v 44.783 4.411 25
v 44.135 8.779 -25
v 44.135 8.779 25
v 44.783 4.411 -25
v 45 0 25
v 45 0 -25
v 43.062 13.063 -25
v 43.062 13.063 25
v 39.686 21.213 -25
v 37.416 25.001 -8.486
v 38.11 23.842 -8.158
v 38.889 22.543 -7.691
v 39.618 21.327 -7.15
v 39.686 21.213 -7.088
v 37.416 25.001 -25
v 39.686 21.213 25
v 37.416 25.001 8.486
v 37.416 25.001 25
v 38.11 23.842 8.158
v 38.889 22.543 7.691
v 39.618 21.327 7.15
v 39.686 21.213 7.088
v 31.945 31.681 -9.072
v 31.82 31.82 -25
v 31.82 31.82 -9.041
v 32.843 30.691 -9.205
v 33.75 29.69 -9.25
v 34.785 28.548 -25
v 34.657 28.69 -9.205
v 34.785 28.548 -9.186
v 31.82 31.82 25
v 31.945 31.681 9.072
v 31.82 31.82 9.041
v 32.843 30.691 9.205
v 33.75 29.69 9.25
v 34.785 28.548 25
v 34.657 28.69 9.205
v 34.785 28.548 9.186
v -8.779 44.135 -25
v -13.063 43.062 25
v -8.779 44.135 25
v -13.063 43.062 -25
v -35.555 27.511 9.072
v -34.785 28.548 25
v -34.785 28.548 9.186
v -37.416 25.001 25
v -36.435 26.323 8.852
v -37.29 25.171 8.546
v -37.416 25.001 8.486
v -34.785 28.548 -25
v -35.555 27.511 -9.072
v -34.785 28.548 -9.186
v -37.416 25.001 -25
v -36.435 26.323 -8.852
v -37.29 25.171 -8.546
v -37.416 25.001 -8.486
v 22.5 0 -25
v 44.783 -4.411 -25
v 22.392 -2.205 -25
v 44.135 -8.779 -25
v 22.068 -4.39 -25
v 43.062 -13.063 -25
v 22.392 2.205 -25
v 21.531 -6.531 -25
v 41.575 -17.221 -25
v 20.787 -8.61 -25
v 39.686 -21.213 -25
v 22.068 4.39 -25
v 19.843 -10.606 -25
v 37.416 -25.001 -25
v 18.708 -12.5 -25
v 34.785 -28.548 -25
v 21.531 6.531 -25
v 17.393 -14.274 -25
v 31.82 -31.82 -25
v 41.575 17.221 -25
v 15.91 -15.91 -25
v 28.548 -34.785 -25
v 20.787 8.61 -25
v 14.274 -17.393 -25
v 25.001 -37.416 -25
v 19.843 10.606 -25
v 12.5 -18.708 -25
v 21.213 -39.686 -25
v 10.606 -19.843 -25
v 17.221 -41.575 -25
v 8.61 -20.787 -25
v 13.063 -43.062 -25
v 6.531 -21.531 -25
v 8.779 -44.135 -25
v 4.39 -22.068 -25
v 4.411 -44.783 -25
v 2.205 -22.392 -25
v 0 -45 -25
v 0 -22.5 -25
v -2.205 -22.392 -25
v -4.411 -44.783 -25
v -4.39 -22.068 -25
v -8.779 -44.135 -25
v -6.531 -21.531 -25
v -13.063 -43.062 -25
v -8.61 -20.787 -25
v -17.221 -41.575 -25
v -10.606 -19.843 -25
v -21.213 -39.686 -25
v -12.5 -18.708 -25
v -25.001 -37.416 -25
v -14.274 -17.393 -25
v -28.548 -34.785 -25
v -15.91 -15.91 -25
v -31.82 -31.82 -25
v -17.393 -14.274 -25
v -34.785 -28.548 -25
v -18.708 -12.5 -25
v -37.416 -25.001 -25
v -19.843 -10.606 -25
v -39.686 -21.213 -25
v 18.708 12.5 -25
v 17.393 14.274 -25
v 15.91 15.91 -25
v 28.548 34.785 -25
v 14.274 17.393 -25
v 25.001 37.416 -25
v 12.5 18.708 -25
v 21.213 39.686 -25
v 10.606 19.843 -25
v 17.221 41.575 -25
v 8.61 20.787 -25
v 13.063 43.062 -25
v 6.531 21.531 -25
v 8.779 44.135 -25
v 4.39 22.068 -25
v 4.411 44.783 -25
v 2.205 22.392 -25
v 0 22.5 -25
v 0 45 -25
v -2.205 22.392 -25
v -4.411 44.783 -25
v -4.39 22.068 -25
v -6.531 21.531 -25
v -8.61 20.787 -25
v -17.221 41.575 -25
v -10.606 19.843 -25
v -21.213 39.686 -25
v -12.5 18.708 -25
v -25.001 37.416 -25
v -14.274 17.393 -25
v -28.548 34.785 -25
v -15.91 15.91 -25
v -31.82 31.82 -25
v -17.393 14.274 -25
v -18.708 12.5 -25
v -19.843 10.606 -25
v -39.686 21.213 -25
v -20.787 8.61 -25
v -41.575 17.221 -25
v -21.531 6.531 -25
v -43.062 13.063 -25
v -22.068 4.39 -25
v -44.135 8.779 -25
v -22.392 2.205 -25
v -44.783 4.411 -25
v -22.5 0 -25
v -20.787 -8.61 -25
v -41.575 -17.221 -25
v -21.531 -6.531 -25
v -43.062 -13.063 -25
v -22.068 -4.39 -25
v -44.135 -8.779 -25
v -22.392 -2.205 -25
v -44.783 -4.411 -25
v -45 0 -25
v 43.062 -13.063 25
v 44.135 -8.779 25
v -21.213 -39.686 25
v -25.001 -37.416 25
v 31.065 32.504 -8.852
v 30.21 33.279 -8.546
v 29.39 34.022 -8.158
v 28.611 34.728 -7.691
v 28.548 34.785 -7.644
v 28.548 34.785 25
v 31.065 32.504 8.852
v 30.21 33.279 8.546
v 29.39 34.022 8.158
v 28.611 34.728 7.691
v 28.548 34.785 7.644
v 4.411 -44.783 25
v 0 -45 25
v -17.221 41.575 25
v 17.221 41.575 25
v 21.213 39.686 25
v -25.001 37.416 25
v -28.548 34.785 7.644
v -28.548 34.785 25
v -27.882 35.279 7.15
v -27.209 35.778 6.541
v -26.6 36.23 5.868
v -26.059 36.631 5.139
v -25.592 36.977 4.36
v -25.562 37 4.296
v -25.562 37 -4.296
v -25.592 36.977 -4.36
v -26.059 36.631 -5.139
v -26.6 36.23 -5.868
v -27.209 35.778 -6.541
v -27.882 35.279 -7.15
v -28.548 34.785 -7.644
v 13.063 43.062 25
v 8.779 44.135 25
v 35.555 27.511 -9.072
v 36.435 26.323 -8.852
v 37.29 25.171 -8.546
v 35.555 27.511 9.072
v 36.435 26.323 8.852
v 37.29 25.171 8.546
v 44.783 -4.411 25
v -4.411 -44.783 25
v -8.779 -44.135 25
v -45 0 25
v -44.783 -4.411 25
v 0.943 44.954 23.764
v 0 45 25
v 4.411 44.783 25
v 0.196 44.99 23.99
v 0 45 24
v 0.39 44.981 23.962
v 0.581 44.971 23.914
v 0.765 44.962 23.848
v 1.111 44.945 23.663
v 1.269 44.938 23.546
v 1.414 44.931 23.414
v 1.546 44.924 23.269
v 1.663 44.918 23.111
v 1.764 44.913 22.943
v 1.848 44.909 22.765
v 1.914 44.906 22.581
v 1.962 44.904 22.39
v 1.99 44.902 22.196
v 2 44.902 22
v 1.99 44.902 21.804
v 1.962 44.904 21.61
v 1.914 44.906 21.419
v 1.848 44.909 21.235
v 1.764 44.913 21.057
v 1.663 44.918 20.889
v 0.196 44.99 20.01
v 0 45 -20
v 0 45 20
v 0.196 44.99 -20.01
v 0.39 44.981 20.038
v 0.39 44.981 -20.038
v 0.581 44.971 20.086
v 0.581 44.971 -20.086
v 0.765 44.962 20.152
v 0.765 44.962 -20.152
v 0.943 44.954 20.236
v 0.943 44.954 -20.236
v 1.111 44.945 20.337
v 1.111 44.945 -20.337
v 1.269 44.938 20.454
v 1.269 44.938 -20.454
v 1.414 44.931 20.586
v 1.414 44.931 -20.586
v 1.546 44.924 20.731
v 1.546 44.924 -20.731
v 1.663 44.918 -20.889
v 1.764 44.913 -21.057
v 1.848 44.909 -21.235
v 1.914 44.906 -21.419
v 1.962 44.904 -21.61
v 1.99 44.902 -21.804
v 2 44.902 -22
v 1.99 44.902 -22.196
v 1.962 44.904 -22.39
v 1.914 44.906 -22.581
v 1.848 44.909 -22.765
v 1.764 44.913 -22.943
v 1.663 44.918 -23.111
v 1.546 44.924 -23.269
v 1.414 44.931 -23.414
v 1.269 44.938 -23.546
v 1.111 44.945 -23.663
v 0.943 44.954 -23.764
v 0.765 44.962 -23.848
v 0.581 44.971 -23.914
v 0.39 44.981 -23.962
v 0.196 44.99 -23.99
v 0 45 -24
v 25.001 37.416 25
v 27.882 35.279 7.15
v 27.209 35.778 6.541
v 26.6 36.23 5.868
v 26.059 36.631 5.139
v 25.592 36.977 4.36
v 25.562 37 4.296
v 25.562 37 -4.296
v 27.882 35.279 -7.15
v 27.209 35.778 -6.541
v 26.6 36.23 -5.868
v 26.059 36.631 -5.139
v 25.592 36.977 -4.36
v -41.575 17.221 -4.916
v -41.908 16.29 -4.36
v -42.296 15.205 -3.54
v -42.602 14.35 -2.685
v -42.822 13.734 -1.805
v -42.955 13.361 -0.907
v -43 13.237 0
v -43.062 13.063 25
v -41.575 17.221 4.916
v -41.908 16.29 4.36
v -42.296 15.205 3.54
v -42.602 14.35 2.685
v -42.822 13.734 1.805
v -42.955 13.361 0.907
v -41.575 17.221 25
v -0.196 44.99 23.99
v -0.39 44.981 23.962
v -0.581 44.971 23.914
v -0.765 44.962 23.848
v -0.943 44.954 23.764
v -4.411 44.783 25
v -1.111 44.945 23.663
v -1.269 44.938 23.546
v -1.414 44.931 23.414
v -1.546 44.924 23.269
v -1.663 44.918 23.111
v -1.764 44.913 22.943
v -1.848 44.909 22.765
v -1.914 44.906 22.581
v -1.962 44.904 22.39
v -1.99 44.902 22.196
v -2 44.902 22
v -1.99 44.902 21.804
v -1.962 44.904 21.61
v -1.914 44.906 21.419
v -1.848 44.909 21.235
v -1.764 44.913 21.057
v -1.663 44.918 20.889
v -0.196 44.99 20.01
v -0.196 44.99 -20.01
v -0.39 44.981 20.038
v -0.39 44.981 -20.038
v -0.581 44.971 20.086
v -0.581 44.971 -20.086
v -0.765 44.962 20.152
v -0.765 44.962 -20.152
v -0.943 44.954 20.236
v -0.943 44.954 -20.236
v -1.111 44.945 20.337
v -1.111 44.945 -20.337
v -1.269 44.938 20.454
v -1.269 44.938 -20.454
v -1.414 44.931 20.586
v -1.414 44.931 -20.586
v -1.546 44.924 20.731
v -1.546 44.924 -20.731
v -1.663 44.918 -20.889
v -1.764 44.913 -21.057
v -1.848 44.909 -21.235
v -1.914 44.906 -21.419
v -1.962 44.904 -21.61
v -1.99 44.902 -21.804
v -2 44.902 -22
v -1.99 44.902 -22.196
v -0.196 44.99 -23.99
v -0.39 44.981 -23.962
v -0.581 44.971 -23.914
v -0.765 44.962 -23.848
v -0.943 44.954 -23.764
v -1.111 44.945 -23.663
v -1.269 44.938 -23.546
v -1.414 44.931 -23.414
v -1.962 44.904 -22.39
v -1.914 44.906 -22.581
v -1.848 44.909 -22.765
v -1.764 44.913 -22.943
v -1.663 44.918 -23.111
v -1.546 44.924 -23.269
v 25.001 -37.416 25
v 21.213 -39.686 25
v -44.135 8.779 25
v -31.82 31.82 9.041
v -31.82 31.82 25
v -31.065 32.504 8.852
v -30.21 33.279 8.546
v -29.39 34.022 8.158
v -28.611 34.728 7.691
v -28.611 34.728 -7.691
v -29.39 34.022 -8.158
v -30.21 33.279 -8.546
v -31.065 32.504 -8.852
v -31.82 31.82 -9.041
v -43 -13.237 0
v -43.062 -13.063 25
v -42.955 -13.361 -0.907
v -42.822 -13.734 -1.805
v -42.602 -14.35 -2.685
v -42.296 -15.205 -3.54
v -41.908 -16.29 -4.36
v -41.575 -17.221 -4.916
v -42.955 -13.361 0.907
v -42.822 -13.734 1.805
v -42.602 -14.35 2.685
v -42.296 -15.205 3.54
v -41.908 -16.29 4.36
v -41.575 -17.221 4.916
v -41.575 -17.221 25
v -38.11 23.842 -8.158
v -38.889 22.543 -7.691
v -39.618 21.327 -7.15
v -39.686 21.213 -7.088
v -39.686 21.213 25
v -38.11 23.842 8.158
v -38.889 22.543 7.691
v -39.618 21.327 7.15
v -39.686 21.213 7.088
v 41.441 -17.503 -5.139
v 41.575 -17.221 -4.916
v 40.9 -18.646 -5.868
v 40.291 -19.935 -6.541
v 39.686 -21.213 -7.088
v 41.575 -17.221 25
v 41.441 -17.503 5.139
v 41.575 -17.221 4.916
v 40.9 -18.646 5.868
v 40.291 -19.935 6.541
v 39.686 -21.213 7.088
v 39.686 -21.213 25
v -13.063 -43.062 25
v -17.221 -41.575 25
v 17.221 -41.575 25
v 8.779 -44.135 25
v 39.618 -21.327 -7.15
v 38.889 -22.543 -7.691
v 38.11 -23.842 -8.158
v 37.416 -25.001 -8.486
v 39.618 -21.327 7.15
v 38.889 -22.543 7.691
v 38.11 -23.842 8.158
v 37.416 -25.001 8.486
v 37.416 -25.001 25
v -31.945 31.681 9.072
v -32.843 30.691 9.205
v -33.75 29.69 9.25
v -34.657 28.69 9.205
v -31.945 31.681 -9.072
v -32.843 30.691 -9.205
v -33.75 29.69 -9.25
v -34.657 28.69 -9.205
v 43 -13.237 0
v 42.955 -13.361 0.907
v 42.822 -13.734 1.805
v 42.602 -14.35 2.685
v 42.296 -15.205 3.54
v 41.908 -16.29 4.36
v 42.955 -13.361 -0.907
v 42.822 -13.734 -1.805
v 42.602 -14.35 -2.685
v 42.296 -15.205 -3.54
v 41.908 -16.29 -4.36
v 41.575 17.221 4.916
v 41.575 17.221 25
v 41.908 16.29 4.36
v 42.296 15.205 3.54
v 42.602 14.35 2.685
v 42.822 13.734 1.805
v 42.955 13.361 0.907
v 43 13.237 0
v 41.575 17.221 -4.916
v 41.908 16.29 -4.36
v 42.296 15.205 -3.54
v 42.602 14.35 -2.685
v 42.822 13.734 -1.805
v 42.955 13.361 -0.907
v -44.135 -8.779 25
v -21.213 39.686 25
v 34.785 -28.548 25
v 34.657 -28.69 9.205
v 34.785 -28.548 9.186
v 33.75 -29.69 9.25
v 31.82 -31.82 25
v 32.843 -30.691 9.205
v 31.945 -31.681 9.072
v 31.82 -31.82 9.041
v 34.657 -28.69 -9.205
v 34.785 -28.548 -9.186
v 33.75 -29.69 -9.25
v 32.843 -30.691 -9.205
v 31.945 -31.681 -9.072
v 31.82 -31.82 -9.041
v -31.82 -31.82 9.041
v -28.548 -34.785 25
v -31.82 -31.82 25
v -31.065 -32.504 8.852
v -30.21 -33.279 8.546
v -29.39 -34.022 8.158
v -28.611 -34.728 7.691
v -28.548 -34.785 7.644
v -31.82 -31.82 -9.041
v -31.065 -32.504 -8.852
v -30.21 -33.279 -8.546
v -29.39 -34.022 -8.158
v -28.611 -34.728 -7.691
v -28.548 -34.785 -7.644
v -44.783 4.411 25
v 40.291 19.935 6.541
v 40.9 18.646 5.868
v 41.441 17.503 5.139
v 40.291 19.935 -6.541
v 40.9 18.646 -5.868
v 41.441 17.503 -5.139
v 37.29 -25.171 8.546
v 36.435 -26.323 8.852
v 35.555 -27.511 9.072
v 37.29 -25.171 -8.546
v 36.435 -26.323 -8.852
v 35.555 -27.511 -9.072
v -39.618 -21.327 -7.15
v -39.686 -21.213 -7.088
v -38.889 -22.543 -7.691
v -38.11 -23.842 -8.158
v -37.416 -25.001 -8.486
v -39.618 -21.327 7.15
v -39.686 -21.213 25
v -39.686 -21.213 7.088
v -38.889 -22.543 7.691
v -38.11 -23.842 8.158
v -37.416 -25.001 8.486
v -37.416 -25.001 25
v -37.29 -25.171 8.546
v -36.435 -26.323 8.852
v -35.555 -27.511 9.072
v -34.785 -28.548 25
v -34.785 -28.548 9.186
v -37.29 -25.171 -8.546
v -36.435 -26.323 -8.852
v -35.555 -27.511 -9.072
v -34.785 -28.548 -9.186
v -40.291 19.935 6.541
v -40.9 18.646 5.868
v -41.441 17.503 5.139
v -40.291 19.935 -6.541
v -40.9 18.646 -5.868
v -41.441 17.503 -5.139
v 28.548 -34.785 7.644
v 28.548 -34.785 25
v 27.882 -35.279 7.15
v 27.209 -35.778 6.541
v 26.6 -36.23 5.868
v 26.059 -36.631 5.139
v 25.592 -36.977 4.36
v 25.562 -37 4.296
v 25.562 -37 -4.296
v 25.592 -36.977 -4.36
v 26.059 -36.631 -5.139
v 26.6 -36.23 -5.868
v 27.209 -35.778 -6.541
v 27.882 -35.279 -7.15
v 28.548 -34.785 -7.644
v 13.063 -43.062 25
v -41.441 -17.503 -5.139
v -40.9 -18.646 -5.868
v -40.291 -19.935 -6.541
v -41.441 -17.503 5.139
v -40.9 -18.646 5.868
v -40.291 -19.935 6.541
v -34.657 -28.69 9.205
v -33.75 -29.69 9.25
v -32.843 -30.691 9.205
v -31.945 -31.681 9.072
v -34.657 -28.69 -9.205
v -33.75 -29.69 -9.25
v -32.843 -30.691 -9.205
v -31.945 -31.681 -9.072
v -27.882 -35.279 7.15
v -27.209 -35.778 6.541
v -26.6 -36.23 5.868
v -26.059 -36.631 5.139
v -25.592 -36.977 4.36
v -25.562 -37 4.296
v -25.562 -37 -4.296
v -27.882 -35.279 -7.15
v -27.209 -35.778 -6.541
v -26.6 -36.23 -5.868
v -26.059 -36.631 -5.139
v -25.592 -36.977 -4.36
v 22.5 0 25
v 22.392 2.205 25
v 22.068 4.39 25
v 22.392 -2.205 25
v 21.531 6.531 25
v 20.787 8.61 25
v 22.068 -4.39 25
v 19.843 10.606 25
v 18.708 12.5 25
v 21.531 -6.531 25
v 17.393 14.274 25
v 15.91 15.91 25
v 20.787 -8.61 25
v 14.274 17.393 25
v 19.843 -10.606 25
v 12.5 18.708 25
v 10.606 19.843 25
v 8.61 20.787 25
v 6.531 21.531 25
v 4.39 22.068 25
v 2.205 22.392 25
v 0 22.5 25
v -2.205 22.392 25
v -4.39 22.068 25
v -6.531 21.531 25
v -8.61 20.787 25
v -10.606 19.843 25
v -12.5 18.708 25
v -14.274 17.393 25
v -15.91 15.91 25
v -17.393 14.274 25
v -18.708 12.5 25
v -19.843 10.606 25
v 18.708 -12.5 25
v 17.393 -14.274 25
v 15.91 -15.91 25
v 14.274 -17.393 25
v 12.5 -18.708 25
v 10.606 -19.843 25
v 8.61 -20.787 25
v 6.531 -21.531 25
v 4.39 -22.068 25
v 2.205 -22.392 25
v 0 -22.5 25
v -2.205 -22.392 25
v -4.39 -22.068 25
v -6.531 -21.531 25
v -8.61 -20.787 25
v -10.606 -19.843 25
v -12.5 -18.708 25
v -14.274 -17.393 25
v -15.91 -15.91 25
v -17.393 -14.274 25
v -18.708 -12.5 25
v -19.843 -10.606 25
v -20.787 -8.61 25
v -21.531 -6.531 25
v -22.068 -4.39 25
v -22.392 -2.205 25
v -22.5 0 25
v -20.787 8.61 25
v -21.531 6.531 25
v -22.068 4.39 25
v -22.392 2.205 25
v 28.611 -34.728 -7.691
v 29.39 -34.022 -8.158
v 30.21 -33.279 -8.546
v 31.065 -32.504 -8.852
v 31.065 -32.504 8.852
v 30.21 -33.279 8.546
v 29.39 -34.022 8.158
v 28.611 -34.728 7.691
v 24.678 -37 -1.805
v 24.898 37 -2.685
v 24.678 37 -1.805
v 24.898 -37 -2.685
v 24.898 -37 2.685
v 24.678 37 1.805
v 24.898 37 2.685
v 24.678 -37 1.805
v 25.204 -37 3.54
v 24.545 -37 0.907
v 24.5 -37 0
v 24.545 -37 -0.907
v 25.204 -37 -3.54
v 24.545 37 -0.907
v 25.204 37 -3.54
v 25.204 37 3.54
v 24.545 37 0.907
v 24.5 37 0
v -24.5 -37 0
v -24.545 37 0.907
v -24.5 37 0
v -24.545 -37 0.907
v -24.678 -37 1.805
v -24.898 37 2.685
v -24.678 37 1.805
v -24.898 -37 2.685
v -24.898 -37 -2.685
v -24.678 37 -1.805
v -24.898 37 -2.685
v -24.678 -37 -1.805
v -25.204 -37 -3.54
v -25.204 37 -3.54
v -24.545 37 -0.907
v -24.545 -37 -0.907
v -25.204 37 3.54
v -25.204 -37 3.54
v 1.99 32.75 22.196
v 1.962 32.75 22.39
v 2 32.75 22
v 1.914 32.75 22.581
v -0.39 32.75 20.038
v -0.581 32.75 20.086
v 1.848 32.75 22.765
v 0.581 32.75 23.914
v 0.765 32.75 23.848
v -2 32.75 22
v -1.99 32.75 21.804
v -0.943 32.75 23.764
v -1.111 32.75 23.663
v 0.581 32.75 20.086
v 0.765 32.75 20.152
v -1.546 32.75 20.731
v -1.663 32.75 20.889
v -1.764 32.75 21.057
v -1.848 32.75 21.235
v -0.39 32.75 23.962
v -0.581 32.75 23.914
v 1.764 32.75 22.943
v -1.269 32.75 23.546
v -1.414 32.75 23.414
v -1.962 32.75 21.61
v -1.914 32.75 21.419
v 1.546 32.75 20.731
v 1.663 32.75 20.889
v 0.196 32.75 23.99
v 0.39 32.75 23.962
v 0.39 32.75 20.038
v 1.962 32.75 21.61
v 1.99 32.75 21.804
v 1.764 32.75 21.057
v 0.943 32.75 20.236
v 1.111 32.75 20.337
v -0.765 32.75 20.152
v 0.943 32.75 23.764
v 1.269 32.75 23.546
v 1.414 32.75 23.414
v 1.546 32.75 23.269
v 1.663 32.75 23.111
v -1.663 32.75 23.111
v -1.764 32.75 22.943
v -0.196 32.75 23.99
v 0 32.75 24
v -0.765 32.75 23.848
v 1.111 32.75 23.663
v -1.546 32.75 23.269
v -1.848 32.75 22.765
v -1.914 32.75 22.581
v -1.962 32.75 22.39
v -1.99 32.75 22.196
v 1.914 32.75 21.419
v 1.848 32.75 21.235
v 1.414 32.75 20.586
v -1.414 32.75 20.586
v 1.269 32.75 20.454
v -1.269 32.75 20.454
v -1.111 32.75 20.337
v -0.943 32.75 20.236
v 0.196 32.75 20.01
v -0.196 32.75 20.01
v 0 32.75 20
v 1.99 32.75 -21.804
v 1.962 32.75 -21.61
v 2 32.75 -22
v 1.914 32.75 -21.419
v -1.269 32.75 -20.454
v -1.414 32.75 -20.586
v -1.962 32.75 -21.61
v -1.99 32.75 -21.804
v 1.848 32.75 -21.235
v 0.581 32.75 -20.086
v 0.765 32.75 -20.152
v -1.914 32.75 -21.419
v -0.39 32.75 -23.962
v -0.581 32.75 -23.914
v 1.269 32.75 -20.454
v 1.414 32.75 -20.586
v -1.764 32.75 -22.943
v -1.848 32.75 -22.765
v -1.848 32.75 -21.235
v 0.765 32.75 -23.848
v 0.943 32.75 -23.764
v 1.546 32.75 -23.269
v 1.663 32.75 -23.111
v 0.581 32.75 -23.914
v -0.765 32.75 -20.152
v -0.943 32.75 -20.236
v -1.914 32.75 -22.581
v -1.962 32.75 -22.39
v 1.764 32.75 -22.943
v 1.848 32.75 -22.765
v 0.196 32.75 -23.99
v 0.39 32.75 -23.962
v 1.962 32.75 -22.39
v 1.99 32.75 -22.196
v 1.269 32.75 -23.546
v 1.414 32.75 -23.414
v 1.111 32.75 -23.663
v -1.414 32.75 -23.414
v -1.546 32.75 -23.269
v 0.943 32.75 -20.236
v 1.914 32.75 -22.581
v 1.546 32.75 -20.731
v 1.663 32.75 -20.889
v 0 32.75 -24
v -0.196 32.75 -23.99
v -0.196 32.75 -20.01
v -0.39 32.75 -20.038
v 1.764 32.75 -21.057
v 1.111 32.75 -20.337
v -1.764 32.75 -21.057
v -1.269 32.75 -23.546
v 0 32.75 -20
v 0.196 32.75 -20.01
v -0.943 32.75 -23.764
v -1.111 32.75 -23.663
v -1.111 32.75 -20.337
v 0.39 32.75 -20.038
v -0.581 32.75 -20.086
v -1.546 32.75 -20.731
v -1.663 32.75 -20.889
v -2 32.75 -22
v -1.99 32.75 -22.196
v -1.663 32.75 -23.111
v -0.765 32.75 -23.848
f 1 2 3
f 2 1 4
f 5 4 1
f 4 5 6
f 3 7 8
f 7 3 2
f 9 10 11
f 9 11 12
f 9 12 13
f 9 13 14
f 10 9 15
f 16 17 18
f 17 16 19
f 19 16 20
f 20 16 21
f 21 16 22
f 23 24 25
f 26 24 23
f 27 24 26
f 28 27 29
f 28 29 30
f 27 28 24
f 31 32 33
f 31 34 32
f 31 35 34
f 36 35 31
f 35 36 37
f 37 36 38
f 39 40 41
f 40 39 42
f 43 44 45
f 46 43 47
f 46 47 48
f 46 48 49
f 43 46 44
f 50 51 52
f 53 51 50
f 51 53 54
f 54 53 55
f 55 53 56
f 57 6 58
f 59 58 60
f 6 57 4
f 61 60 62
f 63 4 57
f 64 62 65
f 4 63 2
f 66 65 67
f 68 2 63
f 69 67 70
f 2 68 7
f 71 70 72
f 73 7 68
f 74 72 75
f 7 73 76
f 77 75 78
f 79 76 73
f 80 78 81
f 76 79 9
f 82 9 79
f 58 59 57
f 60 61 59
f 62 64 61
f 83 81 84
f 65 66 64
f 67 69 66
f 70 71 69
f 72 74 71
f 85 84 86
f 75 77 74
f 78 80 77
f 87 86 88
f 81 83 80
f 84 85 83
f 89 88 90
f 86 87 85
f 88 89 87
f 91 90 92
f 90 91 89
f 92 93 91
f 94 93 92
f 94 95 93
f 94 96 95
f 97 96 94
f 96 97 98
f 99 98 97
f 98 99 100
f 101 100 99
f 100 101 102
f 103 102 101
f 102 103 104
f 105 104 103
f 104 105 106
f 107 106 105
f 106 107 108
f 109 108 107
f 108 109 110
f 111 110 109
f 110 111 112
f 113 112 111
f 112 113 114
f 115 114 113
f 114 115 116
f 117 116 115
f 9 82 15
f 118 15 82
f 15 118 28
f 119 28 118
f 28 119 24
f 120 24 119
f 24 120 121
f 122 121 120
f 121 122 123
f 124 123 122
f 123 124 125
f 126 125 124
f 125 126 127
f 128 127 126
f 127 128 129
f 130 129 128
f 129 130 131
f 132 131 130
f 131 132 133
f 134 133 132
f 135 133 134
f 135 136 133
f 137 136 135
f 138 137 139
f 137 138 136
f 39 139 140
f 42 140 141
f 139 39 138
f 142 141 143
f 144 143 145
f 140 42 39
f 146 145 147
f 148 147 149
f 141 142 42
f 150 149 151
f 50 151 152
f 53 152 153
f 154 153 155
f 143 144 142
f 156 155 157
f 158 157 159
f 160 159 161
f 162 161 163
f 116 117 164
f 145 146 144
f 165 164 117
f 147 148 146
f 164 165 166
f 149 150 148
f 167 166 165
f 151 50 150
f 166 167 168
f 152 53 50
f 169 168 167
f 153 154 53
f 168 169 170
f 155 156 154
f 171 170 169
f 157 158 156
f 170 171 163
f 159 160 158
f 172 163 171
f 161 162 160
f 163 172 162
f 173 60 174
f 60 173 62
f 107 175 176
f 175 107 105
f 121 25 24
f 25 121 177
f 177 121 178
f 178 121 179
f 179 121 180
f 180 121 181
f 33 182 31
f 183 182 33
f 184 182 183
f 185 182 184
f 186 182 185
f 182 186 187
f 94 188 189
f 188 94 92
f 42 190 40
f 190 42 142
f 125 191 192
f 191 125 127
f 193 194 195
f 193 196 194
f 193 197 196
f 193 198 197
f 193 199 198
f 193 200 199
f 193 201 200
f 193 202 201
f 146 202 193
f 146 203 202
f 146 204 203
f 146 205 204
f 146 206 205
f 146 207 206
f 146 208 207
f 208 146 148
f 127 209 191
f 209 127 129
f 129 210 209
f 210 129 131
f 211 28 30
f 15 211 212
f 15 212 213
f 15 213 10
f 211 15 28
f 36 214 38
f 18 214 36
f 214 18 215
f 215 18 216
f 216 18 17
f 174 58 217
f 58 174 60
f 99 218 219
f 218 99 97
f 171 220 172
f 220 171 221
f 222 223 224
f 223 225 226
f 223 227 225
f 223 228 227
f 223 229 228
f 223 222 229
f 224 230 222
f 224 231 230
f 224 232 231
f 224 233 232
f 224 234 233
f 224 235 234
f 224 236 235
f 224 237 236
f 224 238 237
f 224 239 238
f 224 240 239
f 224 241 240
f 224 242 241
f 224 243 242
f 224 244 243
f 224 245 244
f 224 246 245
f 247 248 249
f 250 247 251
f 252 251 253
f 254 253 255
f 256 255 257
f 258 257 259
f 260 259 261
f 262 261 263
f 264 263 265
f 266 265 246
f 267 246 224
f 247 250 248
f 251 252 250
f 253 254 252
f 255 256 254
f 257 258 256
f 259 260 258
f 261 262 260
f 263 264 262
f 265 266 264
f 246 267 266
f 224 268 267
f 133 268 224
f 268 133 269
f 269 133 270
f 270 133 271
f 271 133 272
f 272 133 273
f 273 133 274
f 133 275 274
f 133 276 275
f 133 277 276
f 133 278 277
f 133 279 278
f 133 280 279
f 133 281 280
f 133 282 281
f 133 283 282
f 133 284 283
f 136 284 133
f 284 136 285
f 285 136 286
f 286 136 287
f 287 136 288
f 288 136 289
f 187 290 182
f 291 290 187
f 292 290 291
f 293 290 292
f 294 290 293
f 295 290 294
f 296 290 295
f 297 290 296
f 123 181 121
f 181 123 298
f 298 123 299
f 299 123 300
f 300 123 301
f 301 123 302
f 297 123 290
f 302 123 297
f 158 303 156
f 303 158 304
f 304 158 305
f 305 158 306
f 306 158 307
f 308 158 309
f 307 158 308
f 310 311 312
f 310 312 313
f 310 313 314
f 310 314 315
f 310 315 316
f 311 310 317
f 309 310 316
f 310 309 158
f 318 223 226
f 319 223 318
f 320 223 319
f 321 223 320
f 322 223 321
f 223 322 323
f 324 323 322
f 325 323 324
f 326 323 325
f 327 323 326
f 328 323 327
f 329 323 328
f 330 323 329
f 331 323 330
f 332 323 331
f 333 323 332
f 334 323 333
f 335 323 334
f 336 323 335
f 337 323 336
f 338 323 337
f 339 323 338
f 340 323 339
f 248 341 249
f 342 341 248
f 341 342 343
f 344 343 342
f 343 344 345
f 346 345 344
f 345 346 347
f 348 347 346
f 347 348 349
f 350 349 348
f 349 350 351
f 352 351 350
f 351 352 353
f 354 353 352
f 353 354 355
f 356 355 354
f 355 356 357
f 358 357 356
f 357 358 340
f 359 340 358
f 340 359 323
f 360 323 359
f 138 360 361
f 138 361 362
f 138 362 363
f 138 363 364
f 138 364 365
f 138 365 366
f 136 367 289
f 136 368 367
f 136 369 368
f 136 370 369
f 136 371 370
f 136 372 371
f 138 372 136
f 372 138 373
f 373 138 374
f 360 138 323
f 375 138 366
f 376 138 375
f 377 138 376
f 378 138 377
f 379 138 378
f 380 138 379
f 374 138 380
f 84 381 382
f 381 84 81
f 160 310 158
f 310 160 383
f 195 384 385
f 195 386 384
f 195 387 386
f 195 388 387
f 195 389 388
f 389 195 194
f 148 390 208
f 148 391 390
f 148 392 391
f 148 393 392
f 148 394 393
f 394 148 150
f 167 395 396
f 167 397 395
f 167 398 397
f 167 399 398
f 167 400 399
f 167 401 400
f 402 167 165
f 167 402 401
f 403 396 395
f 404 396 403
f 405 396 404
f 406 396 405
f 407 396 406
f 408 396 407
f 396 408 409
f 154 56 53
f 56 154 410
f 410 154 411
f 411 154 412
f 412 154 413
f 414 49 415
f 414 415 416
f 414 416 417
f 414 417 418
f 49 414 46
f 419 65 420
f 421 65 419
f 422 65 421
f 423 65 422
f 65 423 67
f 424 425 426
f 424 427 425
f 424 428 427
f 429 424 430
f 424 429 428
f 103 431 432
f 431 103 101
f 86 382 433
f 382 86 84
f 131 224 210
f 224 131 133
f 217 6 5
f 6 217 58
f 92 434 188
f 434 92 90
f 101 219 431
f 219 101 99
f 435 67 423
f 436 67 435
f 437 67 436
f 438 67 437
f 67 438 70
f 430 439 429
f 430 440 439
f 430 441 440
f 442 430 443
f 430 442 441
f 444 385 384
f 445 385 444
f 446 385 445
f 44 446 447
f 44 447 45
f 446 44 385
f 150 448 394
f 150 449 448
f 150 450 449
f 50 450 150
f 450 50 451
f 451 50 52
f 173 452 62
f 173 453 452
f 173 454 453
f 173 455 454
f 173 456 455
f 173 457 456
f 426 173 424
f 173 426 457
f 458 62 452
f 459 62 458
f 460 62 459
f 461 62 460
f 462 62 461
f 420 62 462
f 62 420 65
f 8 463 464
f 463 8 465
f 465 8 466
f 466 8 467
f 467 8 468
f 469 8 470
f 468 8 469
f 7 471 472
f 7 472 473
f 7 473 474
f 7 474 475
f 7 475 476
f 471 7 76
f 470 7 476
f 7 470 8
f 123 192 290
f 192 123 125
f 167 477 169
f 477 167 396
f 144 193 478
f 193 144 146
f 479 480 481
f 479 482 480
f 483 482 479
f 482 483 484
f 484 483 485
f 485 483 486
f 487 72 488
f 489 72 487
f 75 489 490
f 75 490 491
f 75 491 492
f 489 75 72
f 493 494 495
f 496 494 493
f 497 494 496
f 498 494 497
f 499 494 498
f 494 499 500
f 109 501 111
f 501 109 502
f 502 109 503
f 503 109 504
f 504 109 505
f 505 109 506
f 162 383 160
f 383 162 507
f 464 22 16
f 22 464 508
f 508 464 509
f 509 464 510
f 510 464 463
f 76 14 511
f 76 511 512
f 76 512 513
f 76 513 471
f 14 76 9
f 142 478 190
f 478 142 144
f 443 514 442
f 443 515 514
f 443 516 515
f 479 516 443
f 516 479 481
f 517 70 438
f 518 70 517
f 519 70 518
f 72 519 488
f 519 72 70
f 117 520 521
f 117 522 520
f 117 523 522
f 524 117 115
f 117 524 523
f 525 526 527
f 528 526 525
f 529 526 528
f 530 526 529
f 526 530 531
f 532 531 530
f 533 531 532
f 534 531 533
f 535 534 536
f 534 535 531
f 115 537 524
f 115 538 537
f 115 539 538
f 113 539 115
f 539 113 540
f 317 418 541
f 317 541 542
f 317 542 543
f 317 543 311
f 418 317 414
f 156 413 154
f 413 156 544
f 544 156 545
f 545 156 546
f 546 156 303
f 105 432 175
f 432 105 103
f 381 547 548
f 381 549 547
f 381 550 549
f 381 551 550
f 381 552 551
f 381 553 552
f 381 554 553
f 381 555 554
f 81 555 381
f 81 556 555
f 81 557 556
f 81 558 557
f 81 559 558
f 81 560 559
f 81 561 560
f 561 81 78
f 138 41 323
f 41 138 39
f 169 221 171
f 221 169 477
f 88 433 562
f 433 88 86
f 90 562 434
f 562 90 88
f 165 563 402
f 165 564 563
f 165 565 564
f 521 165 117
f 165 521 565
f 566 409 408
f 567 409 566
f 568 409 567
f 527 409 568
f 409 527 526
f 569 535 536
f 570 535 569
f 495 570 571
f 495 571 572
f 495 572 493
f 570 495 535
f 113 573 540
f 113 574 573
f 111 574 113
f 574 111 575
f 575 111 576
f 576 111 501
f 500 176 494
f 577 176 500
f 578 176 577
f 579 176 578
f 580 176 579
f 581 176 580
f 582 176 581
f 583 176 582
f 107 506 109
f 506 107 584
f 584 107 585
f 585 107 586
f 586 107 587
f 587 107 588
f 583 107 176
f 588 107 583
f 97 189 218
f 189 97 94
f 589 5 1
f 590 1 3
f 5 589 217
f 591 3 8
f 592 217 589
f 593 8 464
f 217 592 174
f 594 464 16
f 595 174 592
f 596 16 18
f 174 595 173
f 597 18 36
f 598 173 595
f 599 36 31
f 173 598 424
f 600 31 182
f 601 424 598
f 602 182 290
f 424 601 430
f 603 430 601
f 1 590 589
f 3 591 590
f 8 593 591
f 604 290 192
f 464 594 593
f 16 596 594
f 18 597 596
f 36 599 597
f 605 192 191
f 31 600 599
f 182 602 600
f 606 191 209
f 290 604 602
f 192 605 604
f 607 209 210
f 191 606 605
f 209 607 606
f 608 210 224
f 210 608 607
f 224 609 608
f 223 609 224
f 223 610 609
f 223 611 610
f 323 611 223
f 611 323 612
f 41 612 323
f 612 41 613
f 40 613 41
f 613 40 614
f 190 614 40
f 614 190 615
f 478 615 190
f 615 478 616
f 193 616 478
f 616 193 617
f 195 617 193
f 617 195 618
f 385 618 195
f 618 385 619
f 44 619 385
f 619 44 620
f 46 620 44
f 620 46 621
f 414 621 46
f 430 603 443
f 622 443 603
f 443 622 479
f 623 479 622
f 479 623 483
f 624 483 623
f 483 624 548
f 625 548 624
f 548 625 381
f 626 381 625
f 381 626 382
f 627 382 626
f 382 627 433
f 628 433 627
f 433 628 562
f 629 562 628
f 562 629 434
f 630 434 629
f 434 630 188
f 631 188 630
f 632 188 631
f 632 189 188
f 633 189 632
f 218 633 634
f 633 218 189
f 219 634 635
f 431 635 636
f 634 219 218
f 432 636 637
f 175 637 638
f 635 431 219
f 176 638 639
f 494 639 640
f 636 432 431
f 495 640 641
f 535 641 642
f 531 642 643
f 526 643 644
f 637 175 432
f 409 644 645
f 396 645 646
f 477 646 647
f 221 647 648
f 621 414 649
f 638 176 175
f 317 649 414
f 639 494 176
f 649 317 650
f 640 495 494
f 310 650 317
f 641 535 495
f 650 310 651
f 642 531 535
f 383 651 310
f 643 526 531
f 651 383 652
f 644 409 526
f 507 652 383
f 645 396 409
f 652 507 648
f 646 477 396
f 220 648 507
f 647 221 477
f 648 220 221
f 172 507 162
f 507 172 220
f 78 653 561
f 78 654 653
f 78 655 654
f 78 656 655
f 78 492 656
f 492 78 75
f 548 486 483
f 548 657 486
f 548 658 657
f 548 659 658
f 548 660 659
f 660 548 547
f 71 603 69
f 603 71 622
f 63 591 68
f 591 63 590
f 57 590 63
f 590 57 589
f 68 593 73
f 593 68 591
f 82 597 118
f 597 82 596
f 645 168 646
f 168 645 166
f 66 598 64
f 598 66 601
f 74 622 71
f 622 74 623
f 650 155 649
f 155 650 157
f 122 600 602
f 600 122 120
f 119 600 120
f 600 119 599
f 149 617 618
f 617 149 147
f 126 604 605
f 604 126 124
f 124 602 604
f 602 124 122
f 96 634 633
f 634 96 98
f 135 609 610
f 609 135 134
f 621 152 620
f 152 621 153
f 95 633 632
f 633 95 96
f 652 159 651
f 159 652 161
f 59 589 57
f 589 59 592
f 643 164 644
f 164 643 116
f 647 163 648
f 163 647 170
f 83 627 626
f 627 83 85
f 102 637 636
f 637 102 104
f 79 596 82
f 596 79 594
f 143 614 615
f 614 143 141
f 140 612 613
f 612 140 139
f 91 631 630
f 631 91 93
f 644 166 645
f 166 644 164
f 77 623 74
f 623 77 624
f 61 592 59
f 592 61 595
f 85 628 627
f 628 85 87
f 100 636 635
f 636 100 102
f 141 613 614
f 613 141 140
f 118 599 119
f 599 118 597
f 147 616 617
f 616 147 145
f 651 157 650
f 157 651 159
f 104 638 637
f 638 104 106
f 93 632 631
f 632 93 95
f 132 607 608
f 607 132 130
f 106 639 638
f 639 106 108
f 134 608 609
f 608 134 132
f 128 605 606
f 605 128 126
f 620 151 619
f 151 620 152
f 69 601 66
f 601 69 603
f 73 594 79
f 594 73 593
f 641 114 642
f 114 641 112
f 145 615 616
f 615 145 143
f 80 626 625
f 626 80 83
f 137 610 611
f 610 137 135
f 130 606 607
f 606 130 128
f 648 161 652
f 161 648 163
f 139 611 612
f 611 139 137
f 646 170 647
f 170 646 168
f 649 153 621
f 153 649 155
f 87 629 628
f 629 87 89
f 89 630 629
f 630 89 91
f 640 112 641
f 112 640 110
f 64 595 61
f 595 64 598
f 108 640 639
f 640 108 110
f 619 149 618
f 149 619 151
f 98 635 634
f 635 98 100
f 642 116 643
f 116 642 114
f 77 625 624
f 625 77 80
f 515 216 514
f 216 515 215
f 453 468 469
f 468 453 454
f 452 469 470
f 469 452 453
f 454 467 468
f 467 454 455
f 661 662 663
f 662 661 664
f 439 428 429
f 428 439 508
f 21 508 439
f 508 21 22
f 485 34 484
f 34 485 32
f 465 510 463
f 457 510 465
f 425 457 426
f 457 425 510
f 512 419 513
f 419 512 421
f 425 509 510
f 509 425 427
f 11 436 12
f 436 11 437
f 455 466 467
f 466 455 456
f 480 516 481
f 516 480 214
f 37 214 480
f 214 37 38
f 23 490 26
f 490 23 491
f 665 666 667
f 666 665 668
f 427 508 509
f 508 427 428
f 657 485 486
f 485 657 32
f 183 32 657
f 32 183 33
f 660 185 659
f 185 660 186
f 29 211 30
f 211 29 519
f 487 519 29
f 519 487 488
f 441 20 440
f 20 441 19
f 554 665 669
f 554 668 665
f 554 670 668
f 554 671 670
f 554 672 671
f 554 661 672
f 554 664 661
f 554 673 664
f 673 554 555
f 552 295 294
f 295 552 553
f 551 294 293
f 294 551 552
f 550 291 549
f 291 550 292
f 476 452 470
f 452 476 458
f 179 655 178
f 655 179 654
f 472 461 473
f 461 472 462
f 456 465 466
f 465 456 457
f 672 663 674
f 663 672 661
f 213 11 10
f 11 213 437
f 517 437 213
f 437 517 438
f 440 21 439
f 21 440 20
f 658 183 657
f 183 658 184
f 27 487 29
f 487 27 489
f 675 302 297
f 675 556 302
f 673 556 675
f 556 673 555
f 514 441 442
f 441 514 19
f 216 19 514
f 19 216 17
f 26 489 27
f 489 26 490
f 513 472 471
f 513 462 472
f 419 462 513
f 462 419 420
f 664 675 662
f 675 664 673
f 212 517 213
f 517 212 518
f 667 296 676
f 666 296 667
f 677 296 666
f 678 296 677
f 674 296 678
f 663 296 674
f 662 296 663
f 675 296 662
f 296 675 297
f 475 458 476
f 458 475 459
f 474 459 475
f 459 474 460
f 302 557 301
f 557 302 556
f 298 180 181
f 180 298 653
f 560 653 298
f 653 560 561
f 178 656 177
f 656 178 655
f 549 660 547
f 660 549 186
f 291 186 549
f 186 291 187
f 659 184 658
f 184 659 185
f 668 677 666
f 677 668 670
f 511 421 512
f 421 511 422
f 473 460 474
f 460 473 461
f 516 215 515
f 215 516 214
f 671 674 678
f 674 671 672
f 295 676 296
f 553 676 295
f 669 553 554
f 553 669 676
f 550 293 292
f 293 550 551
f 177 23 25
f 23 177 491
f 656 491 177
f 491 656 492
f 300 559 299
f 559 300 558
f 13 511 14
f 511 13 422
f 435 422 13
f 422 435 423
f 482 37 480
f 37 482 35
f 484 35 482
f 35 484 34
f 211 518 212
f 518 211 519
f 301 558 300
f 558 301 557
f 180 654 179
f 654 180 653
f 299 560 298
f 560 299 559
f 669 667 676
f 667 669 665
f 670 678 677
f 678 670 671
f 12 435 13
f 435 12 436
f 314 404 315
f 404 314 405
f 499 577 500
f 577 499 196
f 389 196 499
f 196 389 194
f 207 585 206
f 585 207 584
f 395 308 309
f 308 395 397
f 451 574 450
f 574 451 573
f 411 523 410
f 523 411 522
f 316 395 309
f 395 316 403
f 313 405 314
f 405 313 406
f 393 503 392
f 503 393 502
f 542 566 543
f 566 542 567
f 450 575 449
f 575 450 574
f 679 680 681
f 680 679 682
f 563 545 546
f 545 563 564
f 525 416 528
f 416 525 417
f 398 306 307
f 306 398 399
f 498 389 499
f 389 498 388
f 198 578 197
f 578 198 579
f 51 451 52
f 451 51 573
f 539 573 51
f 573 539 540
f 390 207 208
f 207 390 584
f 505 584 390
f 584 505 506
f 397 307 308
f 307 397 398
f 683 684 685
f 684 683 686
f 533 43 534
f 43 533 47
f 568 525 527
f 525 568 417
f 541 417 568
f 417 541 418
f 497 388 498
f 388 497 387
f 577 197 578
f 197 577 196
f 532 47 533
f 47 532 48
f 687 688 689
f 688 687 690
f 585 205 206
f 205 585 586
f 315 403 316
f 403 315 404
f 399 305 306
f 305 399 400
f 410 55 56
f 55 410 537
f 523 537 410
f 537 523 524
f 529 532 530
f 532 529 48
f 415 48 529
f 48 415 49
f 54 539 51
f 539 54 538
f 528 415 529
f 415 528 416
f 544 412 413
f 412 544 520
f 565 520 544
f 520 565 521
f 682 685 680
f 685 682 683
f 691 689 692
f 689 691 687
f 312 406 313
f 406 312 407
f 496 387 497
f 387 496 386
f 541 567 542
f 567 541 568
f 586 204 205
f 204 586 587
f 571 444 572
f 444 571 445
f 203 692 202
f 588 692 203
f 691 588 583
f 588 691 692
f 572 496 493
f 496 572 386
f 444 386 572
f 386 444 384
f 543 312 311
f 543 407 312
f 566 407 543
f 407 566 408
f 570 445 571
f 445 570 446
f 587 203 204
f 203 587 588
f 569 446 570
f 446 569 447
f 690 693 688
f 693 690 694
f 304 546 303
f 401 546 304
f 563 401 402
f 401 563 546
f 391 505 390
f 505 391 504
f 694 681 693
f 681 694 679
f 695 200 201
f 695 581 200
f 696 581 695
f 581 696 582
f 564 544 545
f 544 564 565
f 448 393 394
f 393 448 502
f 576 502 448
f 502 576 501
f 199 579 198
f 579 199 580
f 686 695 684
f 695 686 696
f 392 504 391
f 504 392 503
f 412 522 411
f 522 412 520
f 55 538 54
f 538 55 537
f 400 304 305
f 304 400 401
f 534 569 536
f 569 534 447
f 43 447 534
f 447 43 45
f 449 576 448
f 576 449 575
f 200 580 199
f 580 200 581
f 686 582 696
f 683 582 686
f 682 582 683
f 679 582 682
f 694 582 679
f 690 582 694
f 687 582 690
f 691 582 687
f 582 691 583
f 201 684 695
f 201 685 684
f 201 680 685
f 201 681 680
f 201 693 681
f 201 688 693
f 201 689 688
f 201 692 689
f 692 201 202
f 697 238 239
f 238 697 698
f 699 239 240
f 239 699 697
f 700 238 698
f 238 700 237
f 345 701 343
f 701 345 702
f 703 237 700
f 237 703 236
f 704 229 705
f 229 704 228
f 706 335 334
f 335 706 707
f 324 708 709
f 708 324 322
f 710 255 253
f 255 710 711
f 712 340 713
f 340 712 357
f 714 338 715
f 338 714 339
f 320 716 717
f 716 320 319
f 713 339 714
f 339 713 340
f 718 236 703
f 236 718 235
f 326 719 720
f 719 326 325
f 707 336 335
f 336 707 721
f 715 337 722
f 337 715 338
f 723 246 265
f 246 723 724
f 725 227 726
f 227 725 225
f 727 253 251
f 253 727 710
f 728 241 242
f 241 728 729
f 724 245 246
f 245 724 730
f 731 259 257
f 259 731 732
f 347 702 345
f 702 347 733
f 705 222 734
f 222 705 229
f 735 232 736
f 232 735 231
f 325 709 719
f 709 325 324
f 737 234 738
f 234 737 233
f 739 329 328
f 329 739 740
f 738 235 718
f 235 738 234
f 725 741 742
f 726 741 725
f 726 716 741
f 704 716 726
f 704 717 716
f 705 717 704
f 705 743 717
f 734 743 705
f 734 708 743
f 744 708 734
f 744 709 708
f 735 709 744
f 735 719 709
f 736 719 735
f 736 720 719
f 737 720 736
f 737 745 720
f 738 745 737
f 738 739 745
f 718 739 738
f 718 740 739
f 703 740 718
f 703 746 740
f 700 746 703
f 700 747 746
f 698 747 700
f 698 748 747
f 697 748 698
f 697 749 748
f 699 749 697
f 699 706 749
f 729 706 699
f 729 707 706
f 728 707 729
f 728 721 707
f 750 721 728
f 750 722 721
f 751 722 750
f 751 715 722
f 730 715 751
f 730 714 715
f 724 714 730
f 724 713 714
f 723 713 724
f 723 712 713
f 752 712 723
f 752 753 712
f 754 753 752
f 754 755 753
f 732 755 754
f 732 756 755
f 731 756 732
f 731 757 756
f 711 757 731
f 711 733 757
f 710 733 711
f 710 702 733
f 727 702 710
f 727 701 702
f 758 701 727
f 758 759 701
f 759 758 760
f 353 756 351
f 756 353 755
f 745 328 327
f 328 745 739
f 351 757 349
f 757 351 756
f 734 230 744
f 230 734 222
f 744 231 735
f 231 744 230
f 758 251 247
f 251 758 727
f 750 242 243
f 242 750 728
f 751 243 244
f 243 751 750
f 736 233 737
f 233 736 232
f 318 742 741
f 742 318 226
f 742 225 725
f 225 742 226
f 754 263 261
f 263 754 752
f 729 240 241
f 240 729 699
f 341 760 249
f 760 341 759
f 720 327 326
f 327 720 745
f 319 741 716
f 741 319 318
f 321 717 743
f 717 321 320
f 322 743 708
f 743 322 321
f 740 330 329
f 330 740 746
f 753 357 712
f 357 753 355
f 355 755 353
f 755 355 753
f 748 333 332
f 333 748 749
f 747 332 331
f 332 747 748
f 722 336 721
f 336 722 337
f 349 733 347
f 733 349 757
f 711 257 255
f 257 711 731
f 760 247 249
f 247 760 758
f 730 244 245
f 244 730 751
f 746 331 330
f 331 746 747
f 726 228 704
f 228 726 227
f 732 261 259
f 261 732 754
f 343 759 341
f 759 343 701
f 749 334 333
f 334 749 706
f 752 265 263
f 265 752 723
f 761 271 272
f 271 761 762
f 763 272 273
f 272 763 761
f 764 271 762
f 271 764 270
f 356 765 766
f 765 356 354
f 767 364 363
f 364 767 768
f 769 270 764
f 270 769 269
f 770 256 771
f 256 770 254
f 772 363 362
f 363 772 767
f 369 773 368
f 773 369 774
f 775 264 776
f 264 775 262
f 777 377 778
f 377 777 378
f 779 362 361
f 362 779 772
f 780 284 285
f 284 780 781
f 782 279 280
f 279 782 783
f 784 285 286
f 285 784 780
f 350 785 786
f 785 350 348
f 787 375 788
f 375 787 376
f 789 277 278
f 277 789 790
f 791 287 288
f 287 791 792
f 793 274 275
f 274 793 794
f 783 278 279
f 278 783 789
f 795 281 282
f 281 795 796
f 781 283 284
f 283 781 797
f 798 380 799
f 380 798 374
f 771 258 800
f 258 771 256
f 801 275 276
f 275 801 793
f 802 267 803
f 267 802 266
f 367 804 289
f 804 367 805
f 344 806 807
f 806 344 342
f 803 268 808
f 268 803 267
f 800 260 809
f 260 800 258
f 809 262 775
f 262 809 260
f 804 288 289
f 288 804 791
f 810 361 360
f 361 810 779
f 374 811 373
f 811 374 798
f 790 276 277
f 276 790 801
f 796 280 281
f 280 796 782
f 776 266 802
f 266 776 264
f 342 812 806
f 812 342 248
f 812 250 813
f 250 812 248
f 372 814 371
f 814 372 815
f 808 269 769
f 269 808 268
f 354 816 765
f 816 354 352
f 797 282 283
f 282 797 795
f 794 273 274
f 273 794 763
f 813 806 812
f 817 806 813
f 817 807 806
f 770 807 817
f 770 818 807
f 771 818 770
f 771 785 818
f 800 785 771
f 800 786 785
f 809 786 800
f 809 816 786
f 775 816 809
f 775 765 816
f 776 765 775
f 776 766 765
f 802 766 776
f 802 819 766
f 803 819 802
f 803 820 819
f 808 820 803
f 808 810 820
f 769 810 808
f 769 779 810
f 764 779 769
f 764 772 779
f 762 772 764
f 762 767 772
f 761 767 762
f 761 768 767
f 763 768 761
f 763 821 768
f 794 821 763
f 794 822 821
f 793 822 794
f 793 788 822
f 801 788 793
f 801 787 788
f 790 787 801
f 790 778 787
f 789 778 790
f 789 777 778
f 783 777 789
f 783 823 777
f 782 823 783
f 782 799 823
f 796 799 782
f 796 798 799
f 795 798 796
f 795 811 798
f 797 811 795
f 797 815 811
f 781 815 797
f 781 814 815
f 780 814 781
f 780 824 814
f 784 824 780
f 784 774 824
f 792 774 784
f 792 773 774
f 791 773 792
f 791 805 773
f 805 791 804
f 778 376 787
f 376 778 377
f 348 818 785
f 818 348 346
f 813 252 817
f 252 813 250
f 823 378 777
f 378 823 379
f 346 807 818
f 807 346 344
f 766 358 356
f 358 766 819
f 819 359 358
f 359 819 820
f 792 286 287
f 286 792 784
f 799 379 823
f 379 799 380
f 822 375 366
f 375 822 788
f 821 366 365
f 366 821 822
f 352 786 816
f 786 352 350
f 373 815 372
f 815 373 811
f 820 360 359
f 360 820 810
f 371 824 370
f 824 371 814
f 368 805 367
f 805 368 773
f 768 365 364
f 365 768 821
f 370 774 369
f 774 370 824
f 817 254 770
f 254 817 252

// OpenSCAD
// COBRA Vertebra - L2 V20
// Height: 50.0mm, OD: 90.0mm

$fn = 64;

difference() {
    // Outer cylinder
    cylinder(h=50.0, d=90.0, center=true);
    
    // Inner channel
    cylinder(h=52.0, d=45.0, center=true);

    // Battery cavity 1
    rotate([0, 0, 0])
    translate([33.75, 0, 0])
    rotate([90, 0, 0])
    cylinder(h=74.0, d=18.5, center=true);

    // Battery cavity 2
    rotate([0, 0, 180])
    translate([33.75, 0, 0])
    rotate([90, 0, 0])
    cylinder(h=74.0, d=18.5, center=true);

    // Pivot holes
    translate([0, 45.0, 22.0])
    rotate([90, 0, 0])
    cylinder(h=24.5, d=4, center=true);
    
    translate([0, 45.0, -22.0])
    rotate([90, 0, 0])
    cylinder(h=24.5, d=4, center=true);
}
